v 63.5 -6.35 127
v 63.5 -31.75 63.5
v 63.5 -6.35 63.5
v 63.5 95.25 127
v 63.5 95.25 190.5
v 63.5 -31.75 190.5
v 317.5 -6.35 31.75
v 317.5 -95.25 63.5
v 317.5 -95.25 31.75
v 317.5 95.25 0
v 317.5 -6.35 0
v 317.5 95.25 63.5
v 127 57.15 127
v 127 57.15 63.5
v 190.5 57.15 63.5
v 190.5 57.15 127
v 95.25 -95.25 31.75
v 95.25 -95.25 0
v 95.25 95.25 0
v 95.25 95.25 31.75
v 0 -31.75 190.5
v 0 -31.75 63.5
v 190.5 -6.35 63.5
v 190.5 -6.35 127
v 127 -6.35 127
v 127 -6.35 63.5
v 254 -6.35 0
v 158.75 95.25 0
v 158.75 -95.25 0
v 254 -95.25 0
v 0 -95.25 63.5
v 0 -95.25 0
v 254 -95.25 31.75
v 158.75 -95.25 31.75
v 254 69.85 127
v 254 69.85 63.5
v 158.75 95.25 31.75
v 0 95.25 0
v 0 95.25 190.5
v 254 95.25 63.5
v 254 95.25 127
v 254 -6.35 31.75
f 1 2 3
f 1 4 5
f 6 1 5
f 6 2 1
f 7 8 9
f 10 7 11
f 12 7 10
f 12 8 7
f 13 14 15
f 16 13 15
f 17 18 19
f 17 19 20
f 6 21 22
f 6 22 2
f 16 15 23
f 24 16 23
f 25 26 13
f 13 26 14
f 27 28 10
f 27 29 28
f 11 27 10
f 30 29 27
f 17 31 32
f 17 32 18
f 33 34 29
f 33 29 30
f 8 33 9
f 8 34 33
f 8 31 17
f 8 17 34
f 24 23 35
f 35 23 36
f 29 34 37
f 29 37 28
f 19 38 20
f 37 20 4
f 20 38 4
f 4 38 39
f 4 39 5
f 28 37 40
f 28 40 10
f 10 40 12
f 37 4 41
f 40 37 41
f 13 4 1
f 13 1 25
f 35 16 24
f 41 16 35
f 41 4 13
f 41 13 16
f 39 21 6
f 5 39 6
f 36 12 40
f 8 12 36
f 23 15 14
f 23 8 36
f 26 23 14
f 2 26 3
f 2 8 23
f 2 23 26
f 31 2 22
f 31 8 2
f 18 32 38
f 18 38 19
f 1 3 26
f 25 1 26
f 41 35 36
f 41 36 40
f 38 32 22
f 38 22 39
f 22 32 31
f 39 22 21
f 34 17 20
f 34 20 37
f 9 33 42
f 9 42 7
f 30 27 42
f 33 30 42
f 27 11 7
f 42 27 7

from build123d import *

# Parameters (mm, degrees)
F1_DEPTH = 95.25
F2_W     = 101.5999999233
F2_H     = 31.75
F3_DEPTH = 63.5
F5_START = -63.5
F4_W     = 63.5
F4_H     = 127
F5_DEPTH = 127
F7_DEPTH = 63.5


with BuildPart() as f1:
    # F0 (on Front) → F1 (new body, symmetric)
    with BuildSketch(Plane.XZ):
        Polygon((0, 63.5), (0, 0), (95.25, 0), (95.25, 31.75), (158.75, 31.75), (158.75, 0), (254, 0), (254, 31.75), (317.5, 31.75), (317.5, 63.5), align=None)
    extrude(amount=F1_DEPTH, both=True)

    # F2 (on face) → F3 (join, symmetric)
    with BuildSketch(Plane.YZ.offset(254)):
        with Locations((44.4500000384, 15.875)):
            Rectangle(F2_W, F2_H)
    extrude(amount=F3_DEPTH, both=True)

    # F4 (on face) → F5 (join)
    with BuildSketch(Plane.XZ.offset(95.25).offset(F5_START)):
        with Locations((31.75, 127)):
            Rectangle(F4_W, F4_H)
    extrude(amount=-F5_DEPTH)

    # F6 (on face) → F7 (join)
    with BuildSketch(Plane.XY.offset(63.5)):
        Polygon((63.5, 95.25), (63.5, -6.35), (127, -6.35), (127, 57.15), (190.5, 57.15), (190.5, -6.35), (254, 69.85), (254, 95.25), align=None)
    extrude(amount=F7_DEPTH)


solid = f1.part
